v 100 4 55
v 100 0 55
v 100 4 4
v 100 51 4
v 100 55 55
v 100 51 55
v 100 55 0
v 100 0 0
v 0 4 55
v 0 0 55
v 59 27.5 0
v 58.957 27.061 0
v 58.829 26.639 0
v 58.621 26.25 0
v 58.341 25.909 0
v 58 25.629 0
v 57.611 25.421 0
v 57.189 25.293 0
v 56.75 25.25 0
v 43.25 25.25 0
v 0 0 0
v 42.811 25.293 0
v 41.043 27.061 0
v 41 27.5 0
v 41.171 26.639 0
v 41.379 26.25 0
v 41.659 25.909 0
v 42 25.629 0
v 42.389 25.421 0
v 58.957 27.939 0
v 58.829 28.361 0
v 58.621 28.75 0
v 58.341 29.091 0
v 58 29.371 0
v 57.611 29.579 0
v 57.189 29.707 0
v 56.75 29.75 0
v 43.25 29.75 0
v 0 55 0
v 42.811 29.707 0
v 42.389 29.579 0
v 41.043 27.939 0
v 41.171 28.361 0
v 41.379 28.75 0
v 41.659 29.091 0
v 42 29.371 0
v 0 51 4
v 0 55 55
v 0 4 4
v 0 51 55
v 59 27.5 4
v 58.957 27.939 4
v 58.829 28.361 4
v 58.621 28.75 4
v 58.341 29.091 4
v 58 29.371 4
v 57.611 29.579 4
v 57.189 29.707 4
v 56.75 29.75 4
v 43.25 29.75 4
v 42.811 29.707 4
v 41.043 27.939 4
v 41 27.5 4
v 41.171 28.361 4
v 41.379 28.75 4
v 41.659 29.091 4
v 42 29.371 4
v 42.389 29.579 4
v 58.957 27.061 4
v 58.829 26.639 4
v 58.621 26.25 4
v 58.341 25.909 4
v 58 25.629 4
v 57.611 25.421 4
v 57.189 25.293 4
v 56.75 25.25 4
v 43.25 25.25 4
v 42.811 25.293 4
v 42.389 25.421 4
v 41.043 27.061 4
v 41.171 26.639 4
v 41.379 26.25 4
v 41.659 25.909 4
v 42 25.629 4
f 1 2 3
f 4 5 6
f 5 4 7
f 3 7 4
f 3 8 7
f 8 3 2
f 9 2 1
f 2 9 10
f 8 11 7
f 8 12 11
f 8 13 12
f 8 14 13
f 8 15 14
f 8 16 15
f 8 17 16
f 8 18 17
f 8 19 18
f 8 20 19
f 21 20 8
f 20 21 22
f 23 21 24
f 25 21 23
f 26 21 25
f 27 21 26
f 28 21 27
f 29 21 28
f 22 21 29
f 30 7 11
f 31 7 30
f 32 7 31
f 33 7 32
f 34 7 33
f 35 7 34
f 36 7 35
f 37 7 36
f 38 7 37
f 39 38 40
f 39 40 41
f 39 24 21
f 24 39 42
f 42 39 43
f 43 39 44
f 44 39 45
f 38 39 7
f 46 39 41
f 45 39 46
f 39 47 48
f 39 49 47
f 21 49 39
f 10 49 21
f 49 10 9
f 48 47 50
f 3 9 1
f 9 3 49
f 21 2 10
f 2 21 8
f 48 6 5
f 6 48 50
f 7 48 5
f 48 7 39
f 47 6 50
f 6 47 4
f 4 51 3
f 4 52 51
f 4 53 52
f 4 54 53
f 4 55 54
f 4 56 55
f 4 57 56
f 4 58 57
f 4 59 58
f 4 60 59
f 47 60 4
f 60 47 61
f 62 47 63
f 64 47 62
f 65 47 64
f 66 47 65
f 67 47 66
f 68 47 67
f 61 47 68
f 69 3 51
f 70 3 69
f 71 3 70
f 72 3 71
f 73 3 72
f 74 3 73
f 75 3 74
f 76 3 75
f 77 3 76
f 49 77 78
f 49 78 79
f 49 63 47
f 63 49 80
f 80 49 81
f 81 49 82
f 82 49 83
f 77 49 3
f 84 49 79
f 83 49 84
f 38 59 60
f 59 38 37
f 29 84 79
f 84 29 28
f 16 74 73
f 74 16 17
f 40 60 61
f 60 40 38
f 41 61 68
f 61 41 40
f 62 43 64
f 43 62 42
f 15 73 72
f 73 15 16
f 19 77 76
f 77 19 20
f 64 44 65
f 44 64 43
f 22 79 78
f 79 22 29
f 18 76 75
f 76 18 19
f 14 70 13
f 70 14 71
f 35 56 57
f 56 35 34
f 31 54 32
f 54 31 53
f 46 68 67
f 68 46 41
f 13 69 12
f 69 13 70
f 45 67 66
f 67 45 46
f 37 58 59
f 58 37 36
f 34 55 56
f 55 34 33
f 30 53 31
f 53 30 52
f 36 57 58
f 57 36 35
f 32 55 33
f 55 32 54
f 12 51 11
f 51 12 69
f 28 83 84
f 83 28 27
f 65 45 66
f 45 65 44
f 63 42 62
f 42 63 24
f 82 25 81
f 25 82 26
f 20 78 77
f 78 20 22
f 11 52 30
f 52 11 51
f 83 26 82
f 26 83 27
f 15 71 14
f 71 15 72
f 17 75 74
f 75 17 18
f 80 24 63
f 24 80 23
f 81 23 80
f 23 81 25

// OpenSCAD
$fn = 32;

// ----------------------------------------------------------------------
// U-bracket: 100 x 55 x 55 mm
// ----------------------------------------------------------------------

// --- parameters (mm) ---
rail_len = 100;           // outer length, X
jaw_w = 55;               // outer width, Y
jaw_h = 55;               // upright height, Z
web_t = 4;                // wall thickness
hole_d = 4.5;             // clearance for M4
slot_l = 18;              // slot length

module hole_z(px, py) {
  translate([px, py, -2.5]) cylinder(h = web_t + 5, d = hole_d);
}
module hole_y_pz(pz) {
  /* through both uprights along Y */
  translate([0, -2.5, pz]) rotate([-90, 0, 0]) cylinder(h = jaw_w + 5, d = hole_d);
}
module slot_z(px, py) {
  hull() {
    translate([px - (slot_l - hole_d) / 2, py, -2.5]) cylinder(h = web_t + 5, d = hole_d);
    translate([px + (slot_l - hole_d) / 2, py, -2.5]) cylinder(h = web_t + 5, d = hole_d);
  }
}

module base() {
  cube([rail_len, jaw_w, web_t]);
}

module uprights() {
  cube([rail_len, web_t, jaw_h]);
  translate([0, jaw_w - web_t, 0]) cube([rail_len, web_t, jaw_h]);
}

difference() {
  union() {
    base();
    uprights();
  }
  slot_z(50, 27.5);
}
